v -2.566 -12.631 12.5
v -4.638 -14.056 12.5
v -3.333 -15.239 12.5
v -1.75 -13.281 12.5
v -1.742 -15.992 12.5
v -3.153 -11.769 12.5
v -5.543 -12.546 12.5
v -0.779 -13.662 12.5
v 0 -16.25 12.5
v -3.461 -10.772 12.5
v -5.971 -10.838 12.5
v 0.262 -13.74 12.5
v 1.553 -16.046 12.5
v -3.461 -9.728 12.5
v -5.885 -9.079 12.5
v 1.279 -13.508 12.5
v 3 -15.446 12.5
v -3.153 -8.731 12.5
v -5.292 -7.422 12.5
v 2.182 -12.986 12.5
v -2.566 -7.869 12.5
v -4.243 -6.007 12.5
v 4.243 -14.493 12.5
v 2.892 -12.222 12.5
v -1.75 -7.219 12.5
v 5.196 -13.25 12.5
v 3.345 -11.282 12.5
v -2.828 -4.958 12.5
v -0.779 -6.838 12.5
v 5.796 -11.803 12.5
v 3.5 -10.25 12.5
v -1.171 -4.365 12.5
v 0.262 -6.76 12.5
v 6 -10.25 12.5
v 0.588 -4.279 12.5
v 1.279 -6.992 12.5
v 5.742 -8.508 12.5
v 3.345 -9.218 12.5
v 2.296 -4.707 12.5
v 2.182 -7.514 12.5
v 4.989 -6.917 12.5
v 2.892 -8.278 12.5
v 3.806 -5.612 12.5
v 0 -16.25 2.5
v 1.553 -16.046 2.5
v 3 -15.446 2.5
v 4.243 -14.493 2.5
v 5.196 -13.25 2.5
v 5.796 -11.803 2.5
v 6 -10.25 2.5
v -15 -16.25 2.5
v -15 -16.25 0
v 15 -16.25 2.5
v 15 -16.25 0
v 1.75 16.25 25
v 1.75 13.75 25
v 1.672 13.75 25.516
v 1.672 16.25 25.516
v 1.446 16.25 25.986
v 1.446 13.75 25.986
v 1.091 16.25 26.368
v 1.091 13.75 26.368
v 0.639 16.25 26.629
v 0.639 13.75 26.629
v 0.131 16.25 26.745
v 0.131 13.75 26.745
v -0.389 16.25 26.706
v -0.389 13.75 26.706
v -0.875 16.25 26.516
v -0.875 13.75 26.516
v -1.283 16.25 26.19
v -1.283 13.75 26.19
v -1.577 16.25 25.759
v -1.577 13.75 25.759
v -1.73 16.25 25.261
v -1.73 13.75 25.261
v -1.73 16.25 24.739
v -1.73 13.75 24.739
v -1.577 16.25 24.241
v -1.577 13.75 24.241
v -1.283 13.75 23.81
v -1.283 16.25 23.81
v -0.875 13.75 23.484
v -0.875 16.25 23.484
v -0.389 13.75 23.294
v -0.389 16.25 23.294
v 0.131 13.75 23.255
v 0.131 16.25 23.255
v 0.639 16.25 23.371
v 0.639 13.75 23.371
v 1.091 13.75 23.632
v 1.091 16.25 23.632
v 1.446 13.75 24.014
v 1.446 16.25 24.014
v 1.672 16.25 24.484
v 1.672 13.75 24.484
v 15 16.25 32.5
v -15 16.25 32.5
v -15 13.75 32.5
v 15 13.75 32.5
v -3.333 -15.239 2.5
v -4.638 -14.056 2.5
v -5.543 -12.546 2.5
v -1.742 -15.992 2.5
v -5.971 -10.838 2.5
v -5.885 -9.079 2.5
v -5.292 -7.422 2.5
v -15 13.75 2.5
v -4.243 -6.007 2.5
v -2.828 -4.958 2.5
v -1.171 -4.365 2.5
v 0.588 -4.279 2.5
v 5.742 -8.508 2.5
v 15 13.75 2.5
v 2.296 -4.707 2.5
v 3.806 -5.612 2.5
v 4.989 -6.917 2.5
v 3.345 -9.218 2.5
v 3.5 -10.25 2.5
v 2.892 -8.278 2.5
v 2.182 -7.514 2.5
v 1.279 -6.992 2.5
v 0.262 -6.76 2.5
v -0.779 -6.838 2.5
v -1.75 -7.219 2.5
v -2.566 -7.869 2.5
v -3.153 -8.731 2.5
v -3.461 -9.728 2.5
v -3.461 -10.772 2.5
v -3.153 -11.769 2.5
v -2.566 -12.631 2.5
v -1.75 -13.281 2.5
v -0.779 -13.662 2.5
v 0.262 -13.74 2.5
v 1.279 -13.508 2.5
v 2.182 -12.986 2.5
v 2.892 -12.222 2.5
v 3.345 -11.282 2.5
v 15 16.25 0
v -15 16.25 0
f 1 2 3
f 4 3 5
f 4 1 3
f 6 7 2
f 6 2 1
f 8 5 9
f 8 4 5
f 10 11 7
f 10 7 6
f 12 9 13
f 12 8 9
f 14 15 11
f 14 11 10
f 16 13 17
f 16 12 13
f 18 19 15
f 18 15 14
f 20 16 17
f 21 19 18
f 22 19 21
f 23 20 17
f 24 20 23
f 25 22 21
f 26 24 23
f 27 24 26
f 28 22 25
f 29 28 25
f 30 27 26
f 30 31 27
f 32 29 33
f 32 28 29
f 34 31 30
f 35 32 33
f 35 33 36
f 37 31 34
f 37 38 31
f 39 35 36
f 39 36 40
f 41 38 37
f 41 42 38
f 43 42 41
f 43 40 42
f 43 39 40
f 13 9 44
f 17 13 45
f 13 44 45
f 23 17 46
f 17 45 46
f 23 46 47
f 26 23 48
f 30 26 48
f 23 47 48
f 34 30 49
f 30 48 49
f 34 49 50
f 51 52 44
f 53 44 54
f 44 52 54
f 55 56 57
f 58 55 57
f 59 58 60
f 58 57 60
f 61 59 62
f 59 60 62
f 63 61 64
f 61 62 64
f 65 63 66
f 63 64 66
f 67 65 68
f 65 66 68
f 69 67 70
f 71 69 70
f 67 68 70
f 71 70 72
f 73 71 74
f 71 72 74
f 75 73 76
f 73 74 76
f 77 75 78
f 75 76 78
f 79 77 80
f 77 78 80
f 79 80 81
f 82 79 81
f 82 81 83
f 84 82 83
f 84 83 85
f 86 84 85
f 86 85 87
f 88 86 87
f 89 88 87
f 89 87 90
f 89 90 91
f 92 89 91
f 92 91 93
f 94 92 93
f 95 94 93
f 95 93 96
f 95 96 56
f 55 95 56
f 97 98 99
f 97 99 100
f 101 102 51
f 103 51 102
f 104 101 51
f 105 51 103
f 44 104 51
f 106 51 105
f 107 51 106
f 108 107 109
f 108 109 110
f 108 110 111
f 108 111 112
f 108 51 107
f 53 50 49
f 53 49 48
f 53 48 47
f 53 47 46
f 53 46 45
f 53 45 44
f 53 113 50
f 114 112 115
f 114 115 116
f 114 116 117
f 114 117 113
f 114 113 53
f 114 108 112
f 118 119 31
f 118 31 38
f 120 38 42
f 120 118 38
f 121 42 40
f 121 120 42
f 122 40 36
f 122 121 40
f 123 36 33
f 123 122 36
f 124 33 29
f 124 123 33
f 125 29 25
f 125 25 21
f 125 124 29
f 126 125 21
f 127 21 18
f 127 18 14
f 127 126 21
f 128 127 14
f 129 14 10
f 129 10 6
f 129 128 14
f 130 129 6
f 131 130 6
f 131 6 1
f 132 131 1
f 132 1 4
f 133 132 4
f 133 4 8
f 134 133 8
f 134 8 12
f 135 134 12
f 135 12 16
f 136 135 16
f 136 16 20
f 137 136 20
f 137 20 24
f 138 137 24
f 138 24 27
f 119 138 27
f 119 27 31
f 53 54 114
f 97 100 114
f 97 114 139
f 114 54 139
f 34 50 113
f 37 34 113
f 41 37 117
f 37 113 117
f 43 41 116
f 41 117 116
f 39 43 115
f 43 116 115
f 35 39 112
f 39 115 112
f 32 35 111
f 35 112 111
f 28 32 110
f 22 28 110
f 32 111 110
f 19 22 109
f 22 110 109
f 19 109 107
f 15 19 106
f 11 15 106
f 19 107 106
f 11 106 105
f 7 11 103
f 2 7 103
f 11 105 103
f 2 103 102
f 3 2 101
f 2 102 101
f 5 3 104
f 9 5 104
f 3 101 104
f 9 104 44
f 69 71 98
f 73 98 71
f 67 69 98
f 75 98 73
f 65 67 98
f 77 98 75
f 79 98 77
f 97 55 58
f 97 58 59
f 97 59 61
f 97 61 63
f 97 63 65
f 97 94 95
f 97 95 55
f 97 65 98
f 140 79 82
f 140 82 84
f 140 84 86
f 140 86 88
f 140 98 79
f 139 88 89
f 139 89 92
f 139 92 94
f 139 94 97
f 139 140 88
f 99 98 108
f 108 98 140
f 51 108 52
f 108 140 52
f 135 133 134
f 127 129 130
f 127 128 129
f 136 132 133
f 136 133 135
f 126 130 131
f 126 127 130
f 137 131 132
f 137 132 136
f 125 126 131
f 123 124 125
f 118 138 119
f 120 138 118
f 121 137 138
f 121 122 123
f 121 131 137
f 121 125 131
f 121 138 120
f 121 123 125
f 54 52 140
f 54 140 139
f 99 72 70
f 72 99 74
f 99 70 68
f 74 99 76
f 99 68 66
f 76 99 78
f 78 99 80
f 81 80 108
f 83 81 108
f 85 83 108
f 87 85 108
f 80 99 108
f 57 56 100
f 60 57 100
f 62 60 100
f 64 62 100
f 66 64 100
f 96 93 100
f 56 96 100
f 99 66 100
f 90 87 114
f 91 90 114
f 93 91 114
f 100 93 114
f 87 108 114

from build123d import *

# Parameters (mm, degrees)
F0_R     = 3.5
F0_W     = 30
F0_H     = 2.5
F1_DEPTH = 2.5
F2_DEPTH = 12.5
F3_DEPTH = 32.5
F4_R     = 1.75
F5_DEPTH = 2.501


with BuildPart() as f1:
    # F0 (on Top) → F1 (new body)
    with BuildSketch(Plane.XY):
        Polygon((-15, 13.75), (-15, -16.25), (6.69e-08, -16.25), (15, -16.25), (15, 13.75), align=None)
        with BuildLine():
            ThreePointArc((6, -10.25), (4.2426407108, -14.4926406635), (6.69e-08, -16.25))
            ThreePointArc((6.69e-08, -16.25), (-4.2426407108, -6.0073593365), (6, -10.25))
        make_face(mode=Mode.SUBTRACT)
        with BuildLine():
            ThreePointArc((6, -10.25), (-4.2426407108, -6.0073593365), (6.69e-08, -16.25))
            ThreePointArc((6.69e-08, -16.25), (4.2426407108, -14.4926406635), (6, -10.25))
        make_face()
        with Locations((0, -10.25)):
            Circle(F0_R, mode=Mode.SUBTRACT)
        with Locations((0, 15)):
            Rectangle(F0_W, F0_H)
        with Locations((0, -10.25)):
            Circle(F0_R)
    extrude(amount=F1_DEPTH)

    # F0 (on Top) → F2 (join)
    with BuildSketch(Plane.XY):
        with BuildLine():
            ThreePointArc((6, -10.25), (-4.2426407108, -6.0073593365), (6.69e-08, -16.25))
            ThreePointArc((6.69e-08, -16.25), (4.2426407108, -14.4926406635), (6, -10.25))
        make_face()
        with Locations((0, -10.25)):
            Circle(F0_R, mode=Mode.SUBTRACT)
    extrude(amount=F2_DEPTH)

    # F0 (on Top) → F3 (join)
    with BuildSketch(Plane.XY):
        with Locations((0, 15)):
            Rectangle(F0_W, F0_H)
    extrude(amount=F3_DEPTH)

    # F4 (on face) → F5 (cut, through all)
    with BuildSketch(Plane.XZ.offset(-13.75)):
        with Locations((0, 25)):
            Circle(F4_R)
    extrude(amount=-F5_DEPTH, mode=Mode.SUBTRACT)


solid = f1.part
